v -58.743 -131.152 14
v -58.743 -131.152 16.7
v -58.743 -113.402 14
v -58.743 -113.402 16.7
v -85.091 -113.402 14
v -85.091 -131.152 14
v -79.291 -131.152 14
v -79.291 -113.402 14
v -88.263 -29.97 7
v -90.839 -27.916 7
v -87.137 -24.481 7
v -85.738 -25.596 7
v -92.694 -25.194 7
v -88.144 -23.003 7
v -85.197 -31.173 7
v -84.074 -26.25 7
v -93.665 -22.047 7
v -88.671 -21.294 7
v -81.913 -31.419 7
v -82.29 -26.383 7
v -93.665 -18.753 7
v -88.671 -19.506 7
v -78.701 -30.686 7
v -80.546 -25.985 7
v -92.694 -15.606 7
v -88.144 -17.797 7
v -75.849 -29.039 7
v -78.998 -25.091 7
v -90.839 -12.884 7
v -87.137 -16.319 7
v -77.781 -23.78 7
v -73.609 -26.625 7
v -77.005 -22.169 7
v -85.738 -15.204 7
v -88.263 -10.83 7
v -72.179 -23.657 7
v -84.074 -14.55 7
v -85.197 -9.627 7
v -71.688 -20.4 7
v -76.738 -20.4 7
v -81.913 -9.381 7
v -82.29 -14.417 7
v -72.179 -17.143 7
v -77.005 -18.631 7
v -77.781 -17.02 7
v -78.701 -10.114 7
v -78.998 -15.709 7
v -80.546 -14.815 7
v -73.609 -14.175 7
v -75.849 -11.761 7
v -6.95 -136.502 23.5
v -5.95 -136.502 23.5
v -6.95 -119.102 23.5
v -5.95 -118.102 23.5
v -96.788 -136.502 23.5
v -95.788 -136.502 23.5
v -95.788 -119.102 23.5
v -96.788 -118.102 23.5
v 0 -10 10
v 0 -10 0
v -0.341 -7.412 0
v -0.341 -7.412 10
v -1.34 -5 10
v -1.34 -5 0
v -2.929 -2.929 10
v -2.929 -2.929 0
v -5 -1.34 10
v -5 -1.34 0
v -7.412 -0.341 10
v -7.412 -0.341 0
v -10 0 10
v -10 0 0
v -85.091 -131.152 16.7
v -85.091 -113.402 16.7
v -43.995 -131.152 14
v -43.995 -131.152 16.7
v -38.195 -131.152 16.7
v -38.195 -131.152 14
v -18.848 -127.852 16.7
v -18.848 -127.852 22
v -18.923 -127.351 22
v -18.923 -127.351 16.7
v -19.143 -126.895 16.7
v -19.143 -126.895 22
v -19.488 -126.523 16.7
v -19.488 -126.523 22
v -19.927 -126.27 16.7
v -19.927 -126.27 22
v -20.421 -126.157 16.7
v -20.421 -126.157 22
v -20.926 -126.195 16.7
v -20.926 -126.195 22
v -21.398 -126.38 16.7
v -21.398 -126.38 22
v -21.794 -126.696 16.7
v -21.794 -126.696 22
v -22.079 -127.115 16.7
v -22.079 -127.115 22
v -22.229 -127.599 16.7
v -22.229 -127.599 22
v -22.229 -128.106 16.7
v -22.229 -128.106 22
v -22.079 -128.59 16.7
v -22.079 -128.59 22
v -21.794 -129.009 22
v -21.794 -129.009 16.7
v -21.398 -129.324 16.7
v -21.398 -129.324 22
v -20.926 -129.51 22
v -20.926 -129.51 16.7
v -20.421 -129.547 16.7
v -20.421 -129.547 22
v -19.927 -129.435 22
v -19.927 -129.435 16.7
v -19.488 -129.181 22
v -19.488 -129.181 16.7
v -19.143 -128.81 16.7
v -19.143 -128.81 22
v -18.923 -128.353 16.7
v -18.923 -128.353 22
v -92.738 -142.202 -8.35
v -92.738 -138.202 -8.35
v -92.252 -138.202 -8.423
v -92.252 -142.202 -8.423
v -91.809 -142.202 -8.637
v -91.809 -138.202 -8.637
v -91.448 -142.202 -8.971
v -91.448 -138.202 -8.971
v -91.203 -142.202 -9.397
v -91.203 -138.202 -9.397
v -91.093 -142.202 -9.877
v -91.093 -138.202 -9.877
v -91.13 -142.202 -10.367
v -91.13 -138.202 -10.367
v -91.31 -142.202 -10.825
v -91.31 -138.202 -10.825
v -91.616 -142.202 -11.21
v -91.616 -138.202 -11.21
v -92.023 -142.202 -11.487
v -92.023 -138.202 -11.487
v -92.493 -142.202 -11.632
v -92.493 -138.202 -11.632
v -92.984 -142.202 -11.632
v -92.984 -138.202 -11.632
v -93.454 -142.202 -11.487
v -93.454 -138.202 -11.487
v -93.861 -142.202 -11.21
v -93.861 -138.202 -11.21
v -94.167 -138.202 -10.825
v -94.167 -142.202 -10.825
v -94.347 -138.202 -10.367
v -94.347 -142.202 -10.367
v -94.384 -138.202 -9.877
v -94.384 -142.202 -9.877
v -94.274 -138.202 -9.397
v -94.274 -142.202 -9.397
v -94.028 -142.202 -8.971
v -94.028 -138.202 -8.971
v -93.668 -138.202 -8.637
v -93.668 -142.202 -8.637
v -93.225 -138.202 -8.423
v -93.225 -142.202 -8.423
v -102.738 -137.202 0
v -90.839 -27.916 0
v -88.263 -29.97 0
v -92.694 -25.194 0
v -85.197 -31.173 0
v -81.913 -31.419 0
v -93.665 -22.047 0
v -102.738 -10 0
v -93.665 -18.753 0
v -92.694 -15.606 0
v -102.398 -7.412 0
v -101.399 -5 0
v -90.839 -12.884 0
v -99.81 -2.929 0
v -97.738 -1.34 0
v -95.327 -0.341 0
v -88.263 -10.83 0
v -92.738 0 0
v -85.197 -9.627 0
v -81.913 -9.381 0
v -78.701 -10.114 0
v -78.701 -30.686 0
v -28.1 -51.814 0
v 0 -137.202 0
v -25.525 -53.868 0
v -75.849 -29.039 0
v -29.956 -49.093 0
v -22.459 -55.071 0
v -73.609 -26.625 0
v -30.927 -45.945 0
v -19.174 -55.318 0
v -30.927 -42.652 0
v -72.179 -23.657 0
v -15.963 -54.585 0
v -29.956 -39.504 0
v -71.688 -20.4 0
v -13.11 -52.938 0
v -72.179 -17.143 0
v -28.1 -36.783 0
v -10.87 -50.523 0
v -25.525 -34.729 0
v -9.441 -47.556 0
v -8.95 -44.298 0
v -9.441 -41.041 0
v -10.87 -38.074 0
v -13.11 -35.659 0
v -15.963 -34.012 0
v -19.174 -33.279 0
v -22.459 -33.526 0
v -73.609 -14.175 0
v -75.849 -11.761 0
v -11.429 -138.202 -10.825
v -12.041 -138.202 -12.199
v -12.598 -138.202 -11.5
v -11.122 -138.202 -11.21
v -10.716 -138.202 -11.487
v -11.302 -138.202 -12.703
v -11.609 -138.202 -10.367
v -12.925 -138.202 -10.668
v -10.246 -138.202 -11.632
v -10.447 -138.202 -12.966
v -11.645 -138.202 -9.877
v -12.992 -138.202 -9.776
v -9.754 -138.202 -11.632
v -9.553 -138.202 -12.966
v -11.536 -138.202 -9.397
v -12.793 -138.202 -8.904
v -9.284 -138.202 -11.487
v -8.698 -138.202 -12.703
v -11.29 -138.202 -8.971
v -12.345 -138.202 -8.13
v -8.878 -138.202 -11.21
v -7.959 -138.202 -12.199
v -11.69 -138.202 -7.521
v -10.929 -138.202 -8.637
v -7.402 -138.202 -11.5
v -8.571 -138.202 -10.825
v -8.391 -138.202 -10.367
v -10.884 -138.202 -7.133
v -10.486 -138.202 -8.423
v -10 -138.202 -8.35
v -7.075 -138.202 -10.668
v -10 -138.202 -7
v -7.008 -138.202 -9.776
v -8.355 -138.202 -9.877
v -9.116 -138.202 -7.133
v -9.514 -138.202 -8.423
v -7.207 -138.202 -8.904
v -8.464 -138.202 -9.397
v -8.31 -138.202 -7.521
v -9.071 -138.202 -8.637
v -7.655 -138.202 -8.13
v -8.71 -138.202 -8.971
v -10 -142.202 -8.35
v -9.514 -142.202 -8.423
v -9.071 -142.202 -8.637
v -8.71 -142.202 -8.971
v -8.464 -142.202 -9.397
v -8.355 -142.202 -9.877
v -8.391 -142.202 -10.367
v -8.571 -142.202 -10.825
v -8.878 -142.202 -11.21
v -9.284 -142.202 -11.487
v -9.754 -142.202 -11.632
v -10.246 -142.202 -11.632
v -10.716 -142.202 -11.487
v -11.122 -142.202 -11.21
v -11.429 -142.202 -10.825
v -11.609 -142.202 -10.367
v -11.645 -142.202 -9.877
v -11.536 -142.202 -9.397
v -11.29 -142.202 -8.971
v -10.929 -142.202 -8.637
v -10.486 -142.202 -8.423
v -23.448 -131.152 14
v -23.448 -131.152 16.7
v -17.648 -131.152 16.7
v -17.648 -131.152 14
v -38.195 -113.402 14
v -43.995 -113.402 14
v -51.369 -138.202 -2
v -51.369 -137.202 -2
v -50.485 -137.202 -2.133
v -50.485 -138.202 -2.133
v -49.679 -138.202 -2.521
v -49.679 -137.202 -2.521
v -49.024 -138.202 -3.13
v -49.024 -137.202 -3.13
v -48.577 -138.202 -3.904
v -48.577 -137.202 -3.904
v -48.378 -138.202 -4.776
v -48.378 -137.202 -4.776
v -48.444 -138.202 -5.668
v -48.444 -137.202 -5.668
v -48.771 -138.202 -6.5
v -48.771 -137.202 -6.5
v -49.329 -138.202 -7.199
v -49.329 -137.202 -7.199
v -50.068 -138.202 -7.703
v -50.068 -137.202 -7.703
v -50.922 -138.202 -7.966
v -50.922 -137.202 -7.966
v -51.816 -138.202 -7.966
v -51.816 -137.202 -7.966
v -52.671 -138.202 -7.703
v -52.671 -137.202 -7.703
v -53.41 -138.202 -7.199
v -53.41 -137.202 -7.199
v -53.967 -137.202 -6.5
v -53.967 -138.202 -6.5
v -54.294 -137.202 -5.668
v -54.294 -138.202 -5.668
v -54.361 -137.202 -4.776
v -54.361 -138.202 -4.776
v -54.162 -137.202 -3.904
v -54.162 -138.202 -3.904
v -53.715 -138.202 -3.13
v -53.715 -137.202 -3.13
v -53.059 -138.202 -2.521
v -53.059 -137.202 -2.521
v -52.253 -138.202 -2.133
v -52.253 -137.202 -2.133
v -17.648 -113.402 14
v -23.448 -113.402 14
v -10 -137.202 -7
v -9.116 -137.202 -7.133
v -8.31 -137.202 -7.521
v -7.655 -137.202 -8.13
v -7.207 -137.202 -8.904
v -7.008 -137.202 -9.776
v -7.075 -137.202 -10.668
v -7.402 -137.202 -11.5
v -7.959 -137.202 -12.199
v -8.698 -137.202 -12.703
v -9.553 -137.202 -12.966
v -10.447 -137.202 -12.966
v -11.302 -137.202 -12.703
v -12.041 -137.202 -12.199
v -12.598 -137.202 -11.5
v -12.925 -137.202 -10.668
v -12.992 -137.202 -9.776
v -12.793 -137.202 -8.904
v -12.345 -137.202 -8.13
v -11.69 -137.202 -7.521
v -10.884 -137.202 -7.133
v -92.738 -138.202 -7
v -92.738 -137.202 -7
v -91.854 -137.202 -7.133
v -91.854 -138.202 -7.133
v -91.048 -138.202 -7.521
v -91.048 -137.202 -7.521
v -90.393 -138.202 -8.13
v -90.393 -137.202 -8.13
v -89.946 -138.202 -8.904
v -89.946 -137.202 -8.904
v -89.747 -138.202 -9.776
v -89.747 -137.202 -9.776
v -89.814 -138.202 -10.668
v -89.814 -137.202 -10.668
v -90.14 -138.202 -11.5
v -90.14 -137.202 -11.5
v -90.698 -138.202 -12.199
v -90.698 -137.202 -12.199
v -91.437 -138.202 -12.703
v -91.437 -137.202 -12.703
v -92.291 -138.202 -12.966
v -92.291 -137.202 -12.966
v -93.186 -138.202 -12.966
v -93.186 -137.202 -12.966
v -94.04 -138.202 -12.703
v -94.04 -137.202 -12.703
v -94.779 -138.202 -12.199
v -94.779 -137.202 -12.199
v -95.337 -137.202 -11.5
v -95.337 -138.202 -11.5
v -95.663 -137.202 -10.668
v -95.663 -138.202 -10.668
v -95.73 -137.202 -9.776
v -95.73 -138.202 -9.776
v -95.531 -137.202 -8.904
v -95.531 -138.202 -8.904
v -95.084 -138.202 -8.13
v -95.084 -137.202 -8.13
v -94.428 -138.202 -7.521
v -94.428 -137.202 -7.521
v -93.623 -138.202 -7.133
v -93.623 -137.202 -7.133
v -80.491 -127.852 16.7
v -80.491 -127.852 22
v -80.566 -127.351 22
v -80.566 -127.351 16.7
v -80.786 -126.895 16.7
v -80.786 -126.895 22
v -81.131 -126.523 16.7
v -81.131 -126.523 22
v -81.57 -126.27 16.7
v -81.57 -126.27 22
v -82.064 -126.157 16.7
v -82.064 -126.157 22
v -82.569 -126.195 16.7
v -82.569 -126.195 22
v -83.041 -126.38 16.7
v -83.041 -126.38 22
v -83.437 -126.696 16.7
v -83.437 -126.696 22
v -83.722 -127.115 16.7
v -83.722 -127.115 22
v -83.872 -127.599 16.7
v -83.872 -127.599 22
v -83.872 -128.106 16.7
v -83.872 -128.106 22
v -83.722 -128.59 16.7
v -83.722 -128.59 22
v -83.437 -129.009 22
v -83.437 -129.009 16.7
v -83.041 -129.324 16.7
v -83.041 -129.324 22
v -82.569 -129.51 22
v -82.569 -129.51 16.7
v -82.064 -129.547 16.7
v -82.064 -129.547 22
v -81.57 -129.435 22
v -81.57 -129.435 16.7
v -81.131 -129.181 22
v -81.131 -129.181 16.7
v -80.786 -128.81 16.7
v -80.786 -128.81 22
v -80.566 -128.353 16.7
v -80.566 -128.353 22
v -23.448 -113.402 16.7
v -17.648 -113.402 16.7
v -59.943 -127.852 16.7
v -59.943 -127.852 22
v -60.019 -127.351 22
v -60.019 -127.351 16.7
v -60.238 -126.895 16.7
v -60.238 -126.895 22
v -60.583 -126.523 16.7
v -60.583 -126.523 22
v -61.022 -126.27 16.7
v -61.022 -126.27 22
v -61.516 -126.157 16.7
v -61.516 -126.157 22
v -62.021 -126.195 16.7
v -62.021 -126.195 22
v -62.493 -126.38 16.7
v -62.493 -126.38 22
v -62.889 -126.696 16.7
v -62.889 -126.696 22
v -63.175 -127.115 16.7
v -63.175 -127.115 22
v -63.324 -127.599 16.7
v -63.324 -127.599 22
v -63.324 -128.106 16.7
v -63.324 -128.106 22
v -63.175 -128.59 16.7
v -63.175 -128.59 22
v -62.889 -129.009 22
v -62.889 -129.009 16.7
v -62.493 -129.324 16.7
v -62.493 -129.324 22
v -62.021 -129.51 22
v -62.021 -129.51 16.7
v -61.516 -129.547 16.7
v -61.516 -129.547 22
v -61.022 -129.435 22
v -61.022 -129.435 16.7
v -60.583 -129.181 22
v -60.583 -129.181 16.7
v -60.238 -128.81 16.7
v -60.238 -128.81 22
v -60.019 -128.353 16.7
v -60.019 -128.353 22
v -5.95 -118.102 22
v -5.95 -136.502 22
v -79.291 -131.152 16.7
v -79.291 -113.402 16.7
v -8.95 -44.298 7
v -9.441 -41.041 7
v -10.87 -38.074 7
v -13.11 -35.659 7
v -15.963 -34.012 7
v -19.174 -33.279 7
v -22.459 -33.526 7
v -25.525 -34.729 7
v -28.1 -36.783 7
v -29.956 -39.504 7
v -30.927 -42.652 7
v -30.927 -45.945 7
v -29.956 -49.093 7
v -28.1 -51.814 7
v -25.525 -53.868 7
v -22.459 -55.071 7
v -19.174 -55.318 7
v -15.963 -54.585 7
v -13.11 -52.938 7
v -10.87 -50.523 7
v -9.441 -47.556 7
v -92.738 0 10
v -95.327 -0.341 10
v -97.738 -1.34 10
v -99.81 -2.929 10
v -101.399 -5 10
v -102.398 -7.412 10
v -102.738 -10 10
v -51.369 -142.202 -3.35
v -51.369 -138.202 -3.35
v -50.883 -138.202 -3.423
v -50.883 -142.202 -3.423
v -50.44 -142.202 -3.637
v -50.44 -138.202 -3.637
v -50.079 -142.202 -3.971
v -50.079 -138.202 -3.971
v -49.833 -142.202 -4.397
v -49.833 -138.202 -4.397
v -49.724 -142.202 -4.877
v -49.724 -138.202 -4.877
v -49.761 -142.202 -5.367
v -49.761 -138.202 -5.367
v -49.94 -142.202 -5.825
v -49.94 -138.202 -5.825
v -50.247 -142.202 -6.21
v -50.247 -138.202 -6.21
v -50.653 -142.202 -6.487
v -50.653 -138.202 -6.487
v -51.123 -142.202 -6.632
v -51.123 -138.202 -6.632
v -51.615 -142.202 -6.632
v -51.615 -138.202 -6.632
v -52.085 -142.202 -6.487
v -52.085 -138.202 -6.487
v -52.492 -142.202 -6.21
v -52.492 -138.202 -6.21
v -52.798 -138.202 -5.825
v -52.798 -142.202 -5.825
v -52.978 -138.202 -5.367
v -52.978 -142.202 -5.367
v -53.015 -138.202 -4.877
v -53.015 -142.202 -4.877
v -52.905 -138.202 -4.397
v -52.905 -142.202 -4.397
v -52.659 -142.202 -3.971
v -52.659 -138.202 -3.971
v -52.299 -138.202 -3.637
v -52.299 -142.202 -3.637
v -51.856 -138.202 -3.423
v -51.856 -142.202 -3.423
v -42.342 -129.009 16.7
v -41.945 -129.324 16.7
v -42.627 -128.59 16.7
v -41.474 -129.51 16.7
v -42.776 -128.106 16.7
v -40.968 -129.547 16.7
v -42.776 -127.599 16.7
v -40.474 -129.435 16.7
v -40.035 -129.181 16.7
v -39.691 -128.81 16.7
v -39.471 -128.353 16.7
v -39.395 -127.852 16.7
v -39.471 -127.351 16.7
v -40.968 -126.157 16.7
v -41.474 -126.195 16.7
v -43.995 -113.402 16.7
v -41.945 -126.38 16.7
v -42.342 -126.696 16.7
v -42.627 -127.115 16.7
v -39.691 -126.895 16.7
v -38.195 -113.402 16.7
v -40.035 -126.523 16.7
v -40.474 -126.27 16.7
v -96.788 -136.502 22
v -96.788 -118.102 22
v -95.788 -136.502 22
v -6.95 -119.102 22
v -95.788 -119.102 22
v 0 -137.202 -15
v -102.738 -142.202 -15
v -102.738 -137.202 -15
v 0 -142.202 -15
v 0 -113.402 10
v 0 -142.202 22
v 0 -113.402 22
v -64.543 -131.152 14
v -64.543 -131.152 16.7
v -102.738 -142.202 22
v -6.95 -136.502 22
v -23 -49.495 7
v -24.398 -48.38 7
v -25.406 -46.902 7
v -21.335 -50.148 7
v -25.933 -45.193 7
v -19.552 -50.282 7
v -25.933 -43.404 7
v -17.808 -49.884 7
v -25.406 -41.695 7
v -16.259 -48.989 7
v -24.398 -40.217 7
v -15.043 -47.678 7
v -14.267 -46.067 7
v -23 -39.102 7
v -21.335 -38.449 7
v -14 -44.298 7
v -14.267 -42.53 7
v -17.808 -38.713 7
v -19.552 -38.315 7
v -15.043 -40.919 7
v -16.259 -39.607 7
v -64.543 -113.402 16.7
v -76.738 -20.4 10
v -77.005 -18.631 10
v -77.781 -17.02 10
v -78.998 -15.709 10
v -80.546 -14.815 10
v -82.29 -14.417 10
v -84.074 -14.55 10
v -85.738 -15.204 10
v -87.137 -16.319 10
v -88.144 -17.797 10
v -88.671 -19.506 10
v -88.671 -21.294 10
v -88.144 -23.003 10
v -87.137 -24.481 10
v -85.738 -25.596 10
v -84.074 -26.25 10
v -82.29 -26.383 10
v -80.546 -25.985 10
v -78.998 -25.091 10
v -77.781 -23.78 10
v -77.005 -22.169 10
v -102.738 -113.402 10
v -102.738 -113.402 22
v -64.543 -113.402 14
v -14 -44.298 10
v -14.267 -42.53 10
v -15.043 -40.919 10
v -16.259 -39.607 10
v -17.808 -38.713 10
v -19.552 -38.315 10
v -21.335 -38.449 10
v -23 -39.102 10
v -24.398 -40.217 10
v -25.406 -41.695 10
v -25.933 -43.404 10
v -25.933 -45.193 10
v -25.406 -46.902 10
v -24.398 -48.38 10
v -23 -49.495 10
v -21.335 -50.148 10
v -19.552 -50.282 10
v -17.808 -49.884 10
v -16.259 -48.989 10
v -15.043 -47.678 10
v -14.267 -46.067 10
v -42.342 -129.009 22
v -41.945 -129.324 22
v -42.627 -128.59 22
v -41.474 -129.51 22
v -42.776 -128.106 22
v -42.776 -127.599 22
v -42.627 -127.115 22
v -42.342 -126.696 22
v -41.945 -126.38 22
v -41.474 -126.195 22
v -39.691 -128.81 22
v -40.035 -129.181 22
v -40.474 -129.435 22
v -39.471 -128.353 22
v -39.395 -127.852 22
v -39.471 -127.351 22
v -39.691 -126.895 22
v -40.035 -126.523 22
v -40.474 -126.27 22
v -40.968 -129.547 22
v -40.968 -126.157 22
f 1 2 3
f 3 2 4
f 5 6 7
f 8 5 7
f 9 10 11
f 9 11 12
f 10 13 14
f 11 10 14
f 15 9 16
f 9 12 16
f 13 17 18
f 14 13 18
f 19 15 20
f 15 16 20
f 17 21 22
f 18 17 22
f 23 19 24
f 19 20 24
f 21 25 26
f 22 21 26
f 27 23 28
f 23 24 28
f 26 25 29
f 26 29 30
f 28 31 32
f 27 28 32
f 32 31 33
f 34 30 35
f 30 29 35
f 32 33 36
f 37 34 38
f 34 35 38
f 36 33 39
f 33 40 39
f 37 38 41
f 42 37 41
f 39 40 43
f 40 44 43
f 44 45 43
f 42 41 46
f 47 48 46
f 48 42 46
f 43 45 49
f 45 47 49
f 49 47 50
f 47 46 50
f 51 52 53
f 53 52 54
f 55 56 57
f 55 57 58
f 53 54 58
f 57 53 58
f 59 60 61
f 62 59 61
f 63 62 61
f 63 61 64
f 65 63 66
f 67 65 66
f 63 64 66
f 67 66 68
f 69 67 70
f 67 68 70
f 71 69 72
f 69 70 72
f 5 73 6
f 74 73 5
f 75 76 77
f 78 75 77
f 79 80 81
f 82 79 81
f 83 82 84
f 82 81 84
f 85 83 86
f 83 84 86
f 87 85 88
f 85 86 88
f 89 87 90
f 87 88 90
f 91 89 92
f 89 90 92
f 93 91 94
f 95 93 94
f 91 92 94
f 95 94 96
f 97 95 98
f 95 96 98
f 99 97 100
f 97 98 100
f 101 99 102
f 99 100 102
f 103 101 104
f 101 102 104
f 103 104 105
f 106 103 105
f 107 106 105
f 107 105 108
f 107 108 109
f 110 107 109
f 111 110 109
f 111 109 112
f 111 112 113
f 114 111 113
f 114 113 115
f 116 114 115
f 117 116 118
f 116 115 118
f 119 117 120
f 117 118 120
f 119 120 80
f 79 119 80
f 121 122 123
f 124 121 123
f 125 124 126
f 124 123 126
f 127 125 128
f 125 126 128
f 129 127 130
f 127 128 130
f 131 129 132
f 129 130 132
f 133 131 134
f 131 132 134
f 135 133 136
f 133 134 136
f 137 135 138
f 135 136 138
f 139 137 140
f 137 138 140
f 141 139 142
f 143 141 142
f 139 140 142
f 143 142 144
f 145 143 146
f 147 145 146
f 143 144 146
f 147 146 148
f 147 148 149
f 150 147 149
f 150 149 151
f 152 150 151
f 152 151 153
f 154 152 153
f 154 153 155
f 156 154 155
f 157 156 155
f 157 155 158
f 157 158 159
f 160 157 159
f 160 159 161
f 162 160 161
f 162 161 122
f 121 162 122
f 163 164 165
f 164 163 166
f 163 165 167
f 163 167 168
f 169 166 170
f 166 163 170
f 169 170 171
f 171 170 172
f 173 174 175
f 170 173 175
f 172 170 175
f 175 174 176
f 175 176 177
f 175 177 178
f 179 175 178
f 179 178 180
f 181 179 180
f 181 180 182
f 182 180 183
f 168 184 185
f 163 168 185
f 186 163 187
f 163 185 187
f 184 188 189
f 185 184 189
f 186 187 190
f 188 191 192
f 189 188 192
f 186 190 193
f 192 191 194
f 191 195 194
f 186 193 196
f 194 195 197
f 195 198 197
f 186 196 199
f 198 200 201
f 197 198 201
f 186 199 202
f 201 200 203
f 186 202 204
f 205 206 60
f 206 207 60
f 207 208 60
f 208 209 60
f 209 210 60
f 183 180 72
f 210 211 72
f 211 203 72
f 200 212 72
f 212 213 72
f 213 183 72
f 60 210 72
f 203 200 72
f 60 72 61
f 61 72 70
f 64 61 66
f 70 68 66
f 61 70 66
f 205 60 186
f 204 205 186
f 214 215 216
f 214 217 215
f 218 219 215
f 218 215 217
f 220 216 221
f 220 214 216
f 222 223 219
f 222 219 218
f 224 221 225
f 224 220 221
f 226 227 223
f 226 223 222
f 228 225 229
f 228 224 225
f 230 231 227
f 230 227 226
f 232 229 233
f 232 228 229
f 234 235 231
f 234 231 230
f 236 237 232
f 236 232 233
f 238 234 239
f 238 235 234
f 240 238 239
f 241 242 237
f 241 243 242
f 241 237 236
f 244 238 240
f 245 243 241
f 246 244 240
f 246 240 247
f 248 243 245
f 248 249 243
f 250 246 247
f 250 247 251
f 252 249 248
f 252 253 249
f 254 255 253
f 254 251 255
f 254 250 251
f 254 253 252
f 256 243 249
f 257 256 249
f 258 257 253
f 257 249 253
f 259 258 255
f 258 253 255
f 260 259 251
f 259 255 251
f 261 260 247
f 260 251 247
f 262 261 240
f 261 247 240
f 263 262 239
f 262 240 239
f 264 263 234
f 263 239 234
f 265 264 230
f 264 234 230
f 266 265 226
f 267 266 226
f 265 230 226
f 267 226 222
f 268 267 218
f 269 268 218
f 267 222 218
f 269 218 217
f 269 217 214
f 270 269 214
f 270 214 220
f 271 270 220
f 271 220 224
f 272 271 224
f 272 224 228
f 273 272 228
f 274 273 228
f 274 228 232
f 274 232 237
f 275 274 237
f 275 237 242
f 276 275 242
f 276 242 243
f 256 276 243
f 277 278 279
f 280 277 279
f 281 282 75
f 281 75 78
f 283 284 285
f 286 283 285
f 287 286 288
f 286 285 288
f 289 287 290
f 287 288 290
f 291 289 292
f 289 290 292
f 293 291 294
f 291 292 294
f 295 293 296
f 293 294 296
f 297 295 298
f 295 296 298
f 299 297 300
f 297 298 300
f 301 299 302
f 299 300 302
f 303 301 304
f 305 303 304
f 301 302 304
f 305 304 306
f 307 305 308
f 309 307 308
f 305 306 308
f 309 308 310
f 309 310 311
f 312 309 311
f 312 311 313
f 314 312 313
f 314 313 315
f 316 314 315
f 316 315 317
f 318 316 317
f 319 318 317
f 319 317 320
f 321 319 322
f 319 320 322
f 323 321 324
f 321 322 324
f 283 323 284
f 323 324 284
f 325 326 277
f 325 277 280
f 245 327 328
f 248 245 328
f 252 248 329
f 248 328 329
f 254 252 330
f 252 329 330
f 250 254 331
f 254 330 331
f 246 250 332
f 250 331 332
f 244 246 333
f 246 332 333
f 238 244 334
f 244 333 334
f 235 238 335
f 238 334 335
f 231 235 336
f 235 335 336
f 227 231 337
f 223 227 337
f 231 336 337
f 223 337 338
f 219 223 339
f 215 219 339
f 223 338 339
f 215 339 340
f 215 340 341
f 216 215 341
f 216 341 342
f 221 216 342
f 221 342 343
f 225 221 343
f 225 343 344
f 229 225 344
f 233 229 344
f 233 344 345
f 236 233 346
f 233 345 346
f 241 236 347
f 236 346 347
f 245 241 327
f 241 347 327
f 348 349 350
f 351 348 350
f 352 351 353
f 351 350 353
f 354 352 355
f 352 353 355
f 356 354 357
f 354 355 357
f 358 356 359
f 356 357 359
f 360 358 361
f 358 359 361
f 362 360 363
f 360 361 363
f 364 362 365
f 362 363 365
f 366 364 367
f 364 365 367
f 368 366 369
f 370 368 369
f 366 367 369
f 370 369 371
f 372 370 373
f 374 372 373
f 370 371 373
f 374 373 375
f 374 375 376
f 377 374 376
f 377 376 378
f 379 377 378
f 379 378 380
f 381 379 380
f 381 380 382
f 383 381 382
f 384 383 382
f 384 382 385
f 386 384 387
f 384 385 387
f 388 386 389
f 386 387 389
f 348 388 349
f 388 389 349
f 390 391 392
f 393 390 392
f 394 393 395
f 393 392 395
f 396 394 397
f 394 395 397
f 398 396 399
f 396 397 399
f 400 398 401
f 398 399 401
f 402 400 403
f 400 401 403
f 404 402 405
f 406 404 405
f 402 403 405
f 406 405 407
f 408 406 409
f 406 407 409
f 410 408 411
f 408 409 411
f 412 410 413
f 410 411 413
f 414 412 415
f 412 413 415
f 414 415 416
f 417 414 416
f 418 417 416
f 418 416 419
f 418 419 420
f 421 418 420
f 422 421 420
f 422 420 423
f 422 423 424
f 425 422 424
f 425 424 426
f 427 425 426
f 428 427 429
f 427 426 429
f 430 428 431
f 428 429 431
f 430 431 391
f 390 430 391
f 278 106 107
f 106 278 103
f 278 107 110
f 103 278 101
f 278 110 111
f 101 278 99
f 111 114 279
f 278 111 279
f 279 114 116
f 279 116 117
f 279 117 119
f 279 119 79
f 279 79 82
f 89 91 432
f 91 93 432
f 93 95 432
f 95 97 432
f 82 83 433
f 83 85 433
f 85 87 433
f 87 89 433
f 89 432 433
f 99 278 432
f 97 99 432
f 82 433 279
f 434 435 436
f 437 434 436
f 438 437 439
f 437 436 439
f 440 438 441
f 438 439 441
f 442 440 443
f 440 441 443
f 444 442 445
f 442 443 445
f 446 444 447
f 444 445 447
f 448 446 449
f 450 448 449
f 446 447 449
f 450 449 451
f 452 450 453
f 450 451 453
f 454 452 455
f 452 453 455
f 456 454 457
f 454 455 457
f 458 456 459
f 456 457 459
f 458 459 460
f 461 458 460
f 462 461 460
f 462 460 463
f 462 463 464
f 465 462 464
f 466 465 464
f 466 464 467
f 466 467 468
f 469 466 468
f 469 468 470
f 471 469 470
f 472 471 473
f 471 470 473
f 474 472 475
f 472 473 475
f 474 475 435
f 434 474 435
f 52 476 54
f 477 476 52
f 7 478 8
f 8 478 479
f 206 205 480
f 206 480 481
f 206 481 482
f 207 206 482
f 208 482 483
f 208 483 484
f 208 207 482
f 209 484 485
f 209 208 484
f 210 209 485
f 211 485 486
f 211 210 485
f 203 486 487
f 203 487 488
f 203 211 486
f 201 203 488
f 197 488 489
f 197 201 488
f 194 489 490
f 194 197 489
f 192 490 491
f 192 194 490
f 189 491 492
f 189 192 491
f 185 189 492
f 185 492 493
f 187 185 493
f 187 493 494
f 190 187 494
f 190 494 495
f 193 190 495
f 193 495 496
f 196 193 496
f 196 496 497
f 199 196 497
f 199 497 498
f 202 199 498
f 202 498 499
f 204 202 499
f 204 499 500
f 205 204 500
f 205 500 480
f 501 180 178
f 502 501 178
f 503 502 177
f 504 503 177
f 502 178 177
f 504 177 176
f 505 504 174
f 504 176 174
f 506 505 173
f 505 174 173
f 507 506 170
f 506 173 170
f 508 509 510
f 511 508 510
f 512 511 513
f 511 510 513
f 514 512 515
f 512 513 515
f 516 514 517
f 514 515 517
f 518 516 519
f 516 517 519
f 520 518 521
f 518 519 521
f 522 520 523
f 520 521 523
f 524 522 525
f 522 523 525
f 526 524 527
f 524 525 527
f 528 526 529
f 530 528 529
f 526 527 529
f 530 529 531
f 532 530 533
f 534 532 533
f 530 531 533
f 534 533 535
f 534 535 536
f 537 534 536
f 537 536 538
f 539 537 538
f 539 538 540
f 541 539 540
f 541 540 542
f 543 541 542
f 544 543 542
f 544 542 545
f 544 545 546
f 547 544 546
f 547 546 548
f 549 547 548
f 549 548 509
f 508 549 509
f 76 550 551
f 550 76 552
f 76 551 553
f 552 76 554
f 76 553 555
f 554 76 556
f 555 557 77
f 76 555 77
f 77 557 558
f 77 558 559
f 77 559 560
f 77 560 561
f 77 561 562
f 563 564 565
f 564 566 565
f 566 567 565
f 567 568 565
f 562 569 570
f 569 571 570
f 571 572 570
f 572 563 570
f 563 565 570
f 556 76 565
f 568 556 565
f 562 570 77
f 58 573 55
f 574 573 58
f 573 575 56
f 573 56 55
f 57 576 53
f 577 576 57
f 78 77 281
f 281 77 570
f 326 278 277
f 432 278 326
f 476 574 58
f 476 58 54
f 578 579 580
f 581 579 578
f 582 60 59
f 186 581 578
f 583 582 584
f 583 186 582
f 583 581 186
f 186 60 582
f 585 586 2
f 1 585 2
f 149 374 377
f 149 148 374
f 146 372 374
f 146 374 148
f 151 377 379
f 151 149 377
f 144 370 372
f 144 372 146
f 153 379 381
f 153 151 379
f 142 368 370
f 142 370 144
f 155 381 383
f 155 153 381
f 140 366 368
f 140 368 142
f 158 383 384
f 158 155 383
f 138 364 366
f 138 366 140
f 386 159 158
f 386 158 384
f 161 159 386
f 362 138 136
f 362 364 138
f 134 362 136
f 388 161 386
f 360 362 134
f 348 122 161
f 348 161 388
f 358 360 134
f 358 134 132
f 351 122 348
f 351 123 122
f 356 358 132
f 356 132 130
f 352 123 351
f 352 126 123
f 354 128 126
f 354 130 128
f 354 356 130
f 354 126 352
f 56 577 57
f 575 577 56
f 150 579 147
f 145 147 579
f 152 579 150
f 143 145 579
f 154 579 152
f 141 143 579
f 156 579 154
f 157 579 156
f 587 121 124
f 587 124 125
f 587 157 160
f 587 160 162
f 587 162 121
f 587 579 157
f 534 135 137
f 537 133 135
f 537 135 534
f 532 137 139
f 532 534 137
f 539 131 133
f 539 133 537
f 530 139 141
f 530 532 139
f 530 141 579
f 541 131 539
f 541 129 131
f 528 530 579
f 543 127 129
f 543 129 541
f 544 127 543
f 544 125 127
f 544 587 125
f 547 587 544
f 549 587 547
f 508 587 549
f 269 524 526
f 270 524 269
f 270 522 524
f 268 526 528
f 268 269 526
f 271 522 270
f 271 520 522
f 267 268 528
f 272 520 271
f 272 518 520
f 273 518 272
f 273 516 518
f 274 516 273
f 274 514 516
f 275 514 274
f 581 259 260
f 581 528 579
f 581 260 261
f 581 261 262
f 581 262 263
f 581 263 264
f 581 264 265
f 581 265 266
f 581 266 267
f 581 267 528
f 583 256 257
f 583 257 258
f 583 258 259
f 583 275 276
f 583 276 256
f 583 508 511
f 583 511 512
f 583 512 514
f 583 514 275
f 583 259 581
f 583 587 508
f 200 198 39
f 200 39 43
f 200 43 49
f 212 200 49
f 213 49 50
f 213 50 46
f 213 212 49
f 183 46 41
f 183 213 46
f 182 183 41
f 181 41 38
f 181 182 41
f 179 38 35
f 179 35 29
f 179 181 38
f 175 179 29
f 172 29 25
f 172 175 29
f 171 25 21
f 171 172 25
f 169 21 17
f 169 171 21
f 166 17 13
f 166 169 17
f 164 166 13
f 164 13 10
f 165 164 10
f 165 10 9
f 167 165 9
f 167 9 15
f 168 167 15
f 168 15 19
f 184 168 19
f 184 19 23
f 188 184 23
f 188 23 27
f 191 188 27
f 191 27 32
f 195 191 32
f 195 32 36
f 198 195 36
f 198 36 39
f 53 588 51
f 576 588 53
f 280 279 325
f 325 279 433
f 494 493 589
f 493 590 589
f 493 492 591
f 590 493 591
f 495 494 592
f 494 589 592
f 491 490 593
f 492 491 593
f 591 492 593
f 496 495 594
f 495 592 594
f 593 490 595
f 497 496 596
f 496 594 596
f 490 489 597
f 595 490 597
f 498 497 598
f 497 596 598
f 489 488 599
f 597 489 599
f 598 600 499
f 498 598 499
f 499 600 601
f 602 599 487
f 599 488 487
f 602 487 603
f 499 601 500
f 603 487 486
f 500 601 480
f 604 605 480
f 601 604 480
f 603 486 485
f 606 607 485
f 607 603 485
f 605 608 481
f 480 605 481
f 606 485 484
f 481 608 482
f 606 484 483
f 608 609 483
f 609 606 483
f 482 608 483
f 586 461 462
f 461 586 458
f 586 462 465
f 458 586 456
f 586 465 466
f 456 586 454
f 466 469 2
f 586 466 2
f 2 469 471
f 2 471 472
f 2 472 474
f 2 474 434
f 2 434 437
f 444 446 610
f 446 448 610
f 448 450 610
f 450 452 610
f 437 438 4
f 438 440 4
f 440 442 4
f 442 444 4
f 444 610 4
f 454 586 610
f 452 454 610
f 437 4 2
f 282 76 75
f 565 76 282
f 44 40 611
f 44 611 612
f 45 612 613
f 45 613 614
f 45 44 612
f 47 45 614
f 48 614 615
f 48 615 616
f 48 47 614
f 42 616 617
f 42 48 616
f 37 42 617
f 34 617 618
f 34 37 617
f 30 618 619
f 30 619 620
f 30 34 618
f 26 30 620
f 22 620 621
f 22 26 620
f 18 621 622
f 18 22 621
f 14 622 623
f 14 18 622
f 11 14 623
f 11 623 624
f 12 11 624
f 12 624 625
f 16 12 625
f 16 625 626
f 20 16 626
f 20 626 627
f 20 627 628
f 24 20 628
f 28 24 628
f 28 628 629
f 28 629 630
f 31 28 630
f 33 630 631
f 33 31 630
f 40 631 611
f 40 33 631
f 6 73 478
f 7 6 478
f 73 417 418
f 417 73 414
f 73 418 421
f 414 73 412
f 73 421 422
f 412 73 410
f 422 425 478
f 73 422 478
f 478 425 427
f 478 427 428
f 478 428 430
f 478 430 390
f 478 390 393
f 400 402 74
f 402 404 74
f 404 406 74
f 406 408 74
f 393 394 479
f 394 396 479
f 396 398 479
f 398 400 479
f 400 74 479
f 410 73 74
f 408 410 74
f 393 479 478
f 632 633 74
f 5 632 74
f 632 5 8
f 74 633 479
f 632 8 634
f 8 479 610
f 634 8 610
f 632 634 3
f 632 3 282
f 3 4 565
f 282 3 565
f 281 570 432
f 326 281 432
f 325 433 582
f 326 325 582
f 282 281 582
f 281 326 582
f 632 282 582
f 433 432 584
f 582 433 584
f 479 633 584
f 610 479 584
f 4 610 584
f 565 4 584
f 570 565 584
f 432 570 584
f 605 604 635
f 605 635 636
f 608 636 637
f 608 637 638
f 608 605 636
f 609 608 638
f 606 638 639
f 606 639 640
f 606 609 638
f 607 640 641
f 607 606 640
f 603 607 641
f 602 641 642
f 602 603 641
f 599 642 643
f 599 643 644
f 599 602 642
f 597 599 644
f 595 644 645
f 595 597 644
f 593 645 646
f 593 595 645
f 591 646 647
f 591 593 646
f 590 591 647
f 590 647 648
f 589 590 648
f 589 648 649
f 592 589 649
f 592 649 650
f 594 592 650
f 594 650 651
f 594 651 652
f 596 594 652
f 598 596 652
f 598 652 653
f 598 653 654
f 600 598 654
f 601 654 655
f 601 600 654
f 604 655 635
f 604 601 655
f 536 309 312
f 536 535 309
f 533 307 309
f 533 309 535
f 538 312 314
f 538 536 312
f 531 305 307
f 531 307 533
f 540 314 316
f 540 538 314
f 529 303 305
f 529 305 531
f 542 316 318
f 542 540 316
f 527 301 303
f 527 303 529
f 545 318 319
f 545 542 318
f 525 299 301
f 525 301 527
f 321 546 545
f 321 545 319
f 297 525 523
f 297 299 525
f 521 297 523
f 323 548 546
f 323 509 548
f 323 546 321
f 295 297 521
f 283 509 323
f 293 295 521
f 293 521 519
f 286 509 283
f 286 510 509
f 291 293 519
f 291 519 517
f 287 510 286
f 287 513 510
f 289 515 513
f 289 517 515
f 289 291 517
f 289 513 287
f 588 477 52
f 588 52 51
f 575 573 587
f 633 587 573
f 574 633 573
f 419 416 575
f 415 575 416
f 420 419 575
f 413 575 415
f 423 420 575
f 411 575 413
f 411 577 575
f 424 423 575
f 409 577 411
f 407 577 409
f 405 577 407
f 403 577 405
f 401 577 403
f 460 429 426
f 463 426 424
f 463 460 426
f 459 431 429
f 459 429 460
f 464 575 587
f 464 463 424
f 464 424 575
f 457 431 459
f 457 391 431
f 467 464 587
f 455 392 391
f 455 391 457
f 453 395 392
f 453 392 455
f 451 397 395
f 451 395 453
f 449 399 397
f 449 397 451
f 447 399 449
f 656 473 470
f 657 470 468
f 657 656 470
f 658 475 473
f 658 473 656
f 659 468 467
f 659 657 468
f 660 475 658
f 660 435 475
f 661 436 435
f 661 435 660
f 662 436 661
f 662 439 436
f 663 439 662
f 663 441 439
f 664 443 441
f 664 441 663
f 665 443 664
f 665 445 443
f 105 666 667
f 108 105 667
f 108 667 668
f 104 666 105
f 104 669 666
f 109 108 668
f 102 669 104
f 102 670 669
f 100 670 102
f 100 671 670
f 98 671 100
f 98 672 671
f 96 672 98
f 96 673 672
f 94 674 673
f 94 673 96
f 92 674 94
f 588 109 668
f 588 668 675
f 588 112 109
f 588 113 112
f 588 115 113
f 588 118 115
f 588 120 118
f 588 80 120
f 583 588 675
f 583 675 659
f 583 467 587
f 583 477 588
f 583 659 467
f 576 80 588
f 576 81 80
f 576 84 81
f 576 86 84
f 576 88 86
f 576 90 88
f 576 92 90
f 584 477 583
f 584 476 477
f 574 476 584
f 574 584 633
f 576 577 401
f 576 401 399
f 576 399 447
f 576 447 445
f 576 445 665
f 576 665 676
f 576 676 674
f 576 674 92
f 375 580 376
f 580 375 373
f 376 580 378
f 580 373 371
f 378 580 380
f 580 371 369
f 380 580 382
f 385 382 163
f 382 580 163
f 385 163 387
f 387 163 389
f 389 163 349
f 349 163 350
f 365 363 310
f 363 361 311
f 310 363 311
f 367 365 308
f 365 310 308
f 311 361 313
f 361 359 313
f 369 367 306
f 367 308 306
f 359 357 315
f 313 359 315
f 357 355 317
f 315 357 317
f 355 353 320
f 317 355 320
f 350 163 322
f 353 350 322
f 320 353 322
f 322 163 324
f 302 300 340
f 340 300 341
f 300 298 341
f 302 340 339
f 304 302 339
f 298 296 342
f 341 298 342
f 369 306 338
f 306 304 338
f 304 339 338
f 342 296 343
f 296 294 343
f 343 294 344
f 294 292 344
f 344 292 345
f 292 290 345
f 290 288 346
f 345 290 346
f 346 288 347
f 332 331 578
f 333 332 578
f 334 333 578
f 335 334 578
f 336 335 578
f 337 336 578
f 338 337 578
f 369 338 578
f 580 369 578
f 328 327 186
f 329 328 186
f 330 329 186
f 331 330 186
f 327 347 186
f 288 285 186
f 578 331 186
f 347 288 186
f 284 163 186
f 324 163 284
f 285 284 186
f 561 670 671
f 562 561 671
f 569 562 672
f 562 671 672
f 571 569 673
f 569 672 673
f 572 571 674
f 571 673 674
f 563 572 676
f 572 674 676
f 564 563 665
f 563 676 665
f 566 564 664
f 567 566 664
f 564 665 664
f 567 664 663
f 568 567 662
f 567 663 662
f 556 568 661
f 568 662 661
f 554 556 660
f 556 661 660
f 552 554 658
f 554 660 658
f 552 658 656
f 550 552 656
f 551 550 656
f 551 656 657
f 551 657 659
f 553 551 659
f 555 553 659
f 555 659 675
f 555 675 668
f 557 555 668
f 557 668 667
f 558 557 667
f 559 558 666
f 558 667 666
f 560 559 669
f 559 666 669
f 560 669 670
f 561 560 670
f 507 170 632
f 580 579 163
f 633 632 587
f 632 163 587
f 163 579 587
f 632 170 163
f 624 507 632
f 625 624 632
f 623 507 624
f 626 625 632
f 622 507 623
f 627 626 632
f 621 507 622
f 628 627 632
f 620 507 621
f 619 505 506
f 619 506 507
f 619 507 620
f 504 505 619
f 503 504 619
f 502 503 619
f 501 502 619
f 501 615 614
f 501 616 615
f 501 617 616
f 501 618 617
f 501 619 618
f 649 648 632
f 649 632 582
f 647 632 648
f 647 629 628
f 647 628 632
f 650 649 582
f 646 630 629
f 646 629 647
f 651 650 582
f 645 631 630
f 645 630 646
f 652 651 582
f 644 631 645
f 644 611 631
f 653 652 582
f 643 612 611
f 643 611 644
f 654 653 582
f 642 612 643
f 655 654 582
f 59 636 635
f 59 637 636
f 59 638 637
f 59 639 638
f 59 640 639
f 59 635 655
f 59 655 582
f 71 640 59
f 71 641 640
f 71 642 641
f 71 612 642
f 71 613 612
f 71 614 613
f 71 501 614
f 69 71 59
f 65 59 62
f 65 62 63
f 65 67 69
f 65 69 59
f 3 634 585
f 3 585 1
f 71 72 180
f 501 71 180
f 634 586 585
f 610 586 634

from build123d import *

# Parameters (mm, degrees)
SKETCH2_R           = 11.05
BOSS_EXTRUDE2_DEPTH = 10
BOSS_EXTRUDE3_START = 7
SKETCH2_4_R         = 11.05
SKETCH2_4_R_2       = 6
BOSS_EXTRUDE3_DEPTH = 3
SKETCH3_W           = 102.73844499
SKETCH3_H           = 28.8
BOSS_EXTRUDE4_DEPTH = 12
SKETCH4_W           = 5.8
SKETCH4_H           = 17.75
CUT_EXTRUDE2_DEPTH  = 8
SKETCH4_7_W         = 5.8
SKETCH4_7_H         = 17.75
SKETCH4_7_R         = 1.7
BOSS_EXTRUDE5_DEPTH = 5.3
BOSS_EXTRUDE6_DEPTH = 1.5
SKETCH6_W           = 102.73844499
SKETCH6_H           = 25
BOSS_EXTRUDE7_DEPTH = 5
SKETCH7_R           = 1.65
CUT_EXTRUDE3_DEPTH  = 5
SKETCH7_6_R         = 3
SKETCH7_6_R_2       = 1.65
CUT_EXTRUDE4_DEPTH  = 1


with BuildPart() as part:
    # Sketch2 → Boss-Extrude2 (new body)
    with BuildSketch(Plane.XY):
        with BuildLine():
            ThreePointArc((0, -10), (-2.928932188, -2.928932188), (-10, 0))
            Line((-10, 0), (-92.73844499, 0))
            ThreePointArc((-92.73844499, 0), (-99.809512802, -2.928932188), (-102.73844499, -10))
            Line((-102.73844499, -10), (-102.73844499, -142.20223365))
            Line((-102.73844499, -142.20223365), (0, -142.20223365))
            Line((0, -142.20223365), (0, -10))
        make_face()
        with Locations((-82.73844499, -20.4)):
            Circle(SKETCH2_R, mode=Mode.SUBTRACT)
        with Locations((-20, -44.29848365)):
            Circle(SKETCH2_R, mode=Mode.SUBTRACT)
    extrude(amount=BOSS_EXTRUDE2_DEPTH)

    # Sketch2<4> → Boss-Extrude3 (add)
    # profile 1 of 2: a face of its own
    with BuildSketch(Plane.XY.offset(BOSS_EXTRUDE3_START)):
        with Locations((-82.73844499, -20.4)):
            Circle(SKETCH2_4_R)
        with Locations((-82.73844499, -20.4)):
            Circle(SKETCH2_4_R_2, mode=Mode.SUBTRACT)
    # profile 2 of 2: a face of its own
    with BuildSketch(Plane.XY.offset(BOSS_EXTRUDE3_START)):
        with Locations((-20, -44.29848365)):
            Circle(SKETCH2_4_R)
        with Locations((-20, -44.29848365)):
            Circle(SKETCH2_4_R_2, mode=Mode.SUBTRACT)
    extrude(amount=BOSS_EXTRUDE3_DEPTH)

    # Sketch3 → Boss-Extrude4 (add)
    with BuildSketch(Plane.XY.offset(10)):
        with Locations((-51.369222495, -127.80223365)):
            Rectangle(SKETCH3_W, SKETCH3_H)
    extrude(amount=BOSS_EXTRUDE4_DEPTH)

    # Sketch4 → Cut-Extrude2 (cut)
    with BuildSketch(Plane.XY.offset(22)):
        with Locations((-61.64306899, -122.27723365)):
            Rectangle(SKETCH4_W, SKETCH4_H)
        with Locations((-82.19075699, -122.27723365)):
            Rectangle(SKETCH4_W, SKETCH4_H)
        with Locations((-41.09538099, -122.27723365)):
            Rectangle(SKETCH4_W, SKETCH4_H)
        with Locations((-20.54769299, -122.27723365)):
            Rectangle(SKETCH4_W, SKETCH4_H)
    extrude(amount=-CUT_EXTRUDE2_DEPTH, mode=Mode.SUBTRACT)

    # Sketch4<7> → Boss-Extrude5 (add)
    # profile 1 of 4: a face of its own
    with BuildSketch(Plane.XY.offset(22)):
        with Locations((-61.64306899, -122.27723365)):
            Rectangle(SKETCH4_7_W, SKETCH4_7_H)
        with Locations((-61.64306899, -127.85223365)):
            Circle(SKETCH4_7_R, mode=Mode.SUBTRACT)
    # profile 2 of 4: a face of its own
    with BuildSketch(Plane.XY.offset(22)):
        with Locations((-82.19075699, -122.27723365)):
            Rectangle(SKETCH4_7_W, SKETCH4_7_H)
        with Locations((-82.19075699, -127.85223365)):
            Circle(SKETCH4_7_R, mode=Mode.SUBTRACT)
    # profile 3 of 4: a face of its own
    with BuildSketch(Plane.XY.offset(22)):
        with Locations((-41.09538099, -122.27723365)):
            Rectangle(SKETCH4_7_W, SKETCH4_7_H)
        with Locations((-41.09538099, -127.85223365)):
            Circle(SKETCH4_7_R, mode=Mode.SUBTRACT)
    # profile 4 of 4: a face of its own
    with BuildSketch(Plane.XY.offset(22)):
        with Locations((-20.54769299, -122.27723365)):
            Rectangle(SKETCH4_7_W, SKETCH4_7_H)
        with Locations((-20.54769299, -127.85223365)):
            Circle(SKETCH4_7_R, mode=Mode.SUBTRACT)
    extrude(amount=-BOSS_EXTRUDE5_DEPTH)

    # Sketch5 → Boss-Extrude6 (add)
    with BuildSketch(Plane.XY.offset(22)):
        Polygon((-95.78844499, -136.50223365), (-96.78844499, -136.50223365), (-96.78844499, -118.10223365), (-5.95, -118.10223365), (-5.95, -136.50223365), (-6.95, -136.50223365), (-6.95, -119.10223365), (-95.78844499, -119.10223365), align=None)
    extrude(amount=BOSS_EXTRUDE6_DEPTH)

    # Sketch6 → Boss-Extrude7 (add)
    with BuildSketch(Plane.XZ.offset(142.20223365)):
        with Locations((-51.369222495, -2.5)):
            Rectangle(SKETCH6_W, SKETCH6_H)
    extrude(amount=-BOSS_EXTRUDE7_DEPTH)

    # Sketch7 → Cut-Extrude3 (cut)
    with BuildSketch(Plane(origin=(-101.64020113, -137.20223365, -23.052849439), x_dir=(-1, 0, 0), z_dir=(0, 1, 0))):
        with Locations((-91.64020113, 13.052849439)):
            Circle(SKETCH7_R)
        with Locations((-50.270978635, 18.052849439)):
            Circle(SKETCH7_R)
        with Locations((-8.90175614, 13.052849439)):
            Circle(SKETCH7_R)
    extrude(amount=-CUT_EXTRUDE3_DEPTH, mode=Mode.SUBTRACT)

    # Sketch7<6> → Cut-Extrude4 (cut)
    # profile 1 of 3: a face of its own
    with BuildSketch(Plane(origin=(-101.64020113, -137.20223365, -23.052849439), x_dir=(-1, 0, 0), z_dir=(0, 1, 0))):
        with Locations((-91.64020113, 13.052849439)):
            Circle(SKETCH7_6_R)
        with Locations((-91.64020113, 13.052849439)):
            Circle(SKETCH7_6_R_2, mode=Mode.SUBTRACT)
    # profile 2 of 3: a face of its own
    with BuildSketch(Plane(origin=(-101.64020113, -137.20223365, -23.052849439), x_dir=(-1, 0, 0), z_dir=(0, 1, 0))):
        with Locations((-50.270978635, 18.052849439)):
            Circle(SKETCH7_6_R)
        with Locations((-50.270978635, 18.052849439)):
            Circle(SKETCH7_6_R_2, mode=Mode.SUBTRACT)
    # profile 3 of 3: a face of its own
    with BuildSketch(Plane(origin=(-101.64020113, -137.20223365, -23.052849439), x_dir=(-1, 0, 0), z_dir=(0, 1, 0))):
        with Locations((-8.90175614, 13.052849439)):
            Circle(SKETCH7_6_R)
        with Locations((-8.90175614, 13.052849439)):
            Circle(SKETCH7_6_R_2, mode=Mode.SUBTRACT)
    extrude(amount=-CUT_EXTRUDE4_DEPTH, mode=Mode.SUBTRACT)


solid = part.part
